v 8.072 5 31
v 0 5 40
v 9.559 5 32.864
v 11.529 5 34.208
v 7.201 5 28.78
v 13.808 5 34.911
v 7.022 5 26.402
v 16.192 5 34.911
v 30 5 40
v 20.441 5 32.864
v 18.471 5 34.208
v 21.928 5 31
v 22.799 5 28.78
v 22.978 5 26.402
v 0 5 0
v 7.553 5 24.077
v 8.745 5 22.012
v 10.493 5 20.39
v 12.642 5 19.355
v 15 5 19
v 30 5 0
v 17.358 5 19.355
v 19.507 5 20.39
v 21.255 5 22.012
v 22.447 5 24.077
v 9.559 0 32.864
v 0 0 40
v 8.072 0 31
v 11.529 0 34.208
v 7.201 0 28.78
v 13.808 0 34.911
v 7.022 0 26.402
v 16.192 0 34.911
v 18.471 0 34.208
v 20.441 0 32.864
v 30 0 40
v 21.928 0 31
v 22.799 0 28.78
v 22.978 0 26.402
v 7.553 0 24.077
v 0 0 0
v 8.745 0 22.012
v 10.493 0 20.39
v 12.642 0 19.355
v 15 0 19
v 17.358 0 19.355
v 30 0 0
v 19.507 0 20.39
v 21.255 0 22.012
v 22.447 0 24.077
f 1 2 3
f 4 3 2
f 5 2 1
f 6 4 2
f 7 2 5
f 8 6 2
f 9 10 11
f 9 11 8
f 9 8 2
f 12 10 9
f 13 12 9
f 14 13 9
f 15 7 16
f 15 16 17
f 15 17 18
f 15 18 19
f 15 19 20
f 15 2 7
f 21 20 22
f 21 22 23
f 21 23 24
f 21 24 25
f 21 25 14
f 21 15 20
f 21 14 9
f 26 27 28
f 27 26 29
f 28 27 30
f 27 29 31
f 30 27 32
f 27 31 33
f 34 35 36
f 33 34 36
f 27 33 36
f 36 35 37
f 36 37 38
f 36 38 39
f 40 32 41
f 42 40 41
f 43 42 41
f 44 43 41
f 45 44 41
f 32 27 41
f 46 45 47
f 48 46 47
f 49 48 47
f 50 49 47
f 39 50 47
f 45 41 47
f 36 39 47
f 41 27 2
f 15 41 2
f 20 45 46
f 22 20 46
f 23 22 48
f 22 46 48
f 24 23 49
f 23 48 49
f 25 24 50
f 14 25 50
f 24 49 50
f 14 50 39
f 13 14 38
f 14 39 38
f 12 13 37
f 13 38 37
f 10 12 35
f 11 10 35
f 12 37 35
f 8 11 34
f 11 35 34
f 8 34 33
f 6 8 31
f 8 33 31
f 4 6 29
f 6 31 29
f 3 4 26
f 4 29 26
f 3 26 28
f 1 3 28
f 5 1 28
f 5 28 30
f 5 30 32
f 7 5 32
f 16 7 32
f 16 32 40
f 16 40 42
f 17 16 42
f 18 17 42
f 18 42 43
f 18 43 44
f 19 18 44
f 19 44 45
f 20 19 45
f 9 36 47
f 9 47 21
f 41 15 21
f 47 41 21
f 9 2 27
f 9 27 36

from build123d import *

# Parameters (mm, degrees)
ESQUISSE1_W             = 30
ESQUISSE1_H             = 5
BOSS_EXTRU_1_DEPTH      = 40
ESQUISSE2_R             = 8
ENL_V_MAT_EXTRU_1_DEPTH = 51.249378106


with BuildPart() as part:
    # Esquisse1 → Boss.-Extru.1 (new body)
    with BuildSketch(Plane.XY):
        with Locations((15, 2.5)):
            Rectangle(ESQUISSE1_W, ESQUISSE1_H)
    extrude(amount=BOSS_EXTRU_1_DEPTH)

    # Esquisse2 → Enlèv. mat.-Extru.1 (cut, through all)
    with BuildSketch(Plane.XZ):
        with Locations(Location((15, 27, 0), (0, 0, 270))):
            Circle(ESQUISSE2_R)
    extrude(amount=-ENL_V_MAT_EXTRU_1_DEPTH, mode=Mode.SUBTRACT)


solid = part.part
